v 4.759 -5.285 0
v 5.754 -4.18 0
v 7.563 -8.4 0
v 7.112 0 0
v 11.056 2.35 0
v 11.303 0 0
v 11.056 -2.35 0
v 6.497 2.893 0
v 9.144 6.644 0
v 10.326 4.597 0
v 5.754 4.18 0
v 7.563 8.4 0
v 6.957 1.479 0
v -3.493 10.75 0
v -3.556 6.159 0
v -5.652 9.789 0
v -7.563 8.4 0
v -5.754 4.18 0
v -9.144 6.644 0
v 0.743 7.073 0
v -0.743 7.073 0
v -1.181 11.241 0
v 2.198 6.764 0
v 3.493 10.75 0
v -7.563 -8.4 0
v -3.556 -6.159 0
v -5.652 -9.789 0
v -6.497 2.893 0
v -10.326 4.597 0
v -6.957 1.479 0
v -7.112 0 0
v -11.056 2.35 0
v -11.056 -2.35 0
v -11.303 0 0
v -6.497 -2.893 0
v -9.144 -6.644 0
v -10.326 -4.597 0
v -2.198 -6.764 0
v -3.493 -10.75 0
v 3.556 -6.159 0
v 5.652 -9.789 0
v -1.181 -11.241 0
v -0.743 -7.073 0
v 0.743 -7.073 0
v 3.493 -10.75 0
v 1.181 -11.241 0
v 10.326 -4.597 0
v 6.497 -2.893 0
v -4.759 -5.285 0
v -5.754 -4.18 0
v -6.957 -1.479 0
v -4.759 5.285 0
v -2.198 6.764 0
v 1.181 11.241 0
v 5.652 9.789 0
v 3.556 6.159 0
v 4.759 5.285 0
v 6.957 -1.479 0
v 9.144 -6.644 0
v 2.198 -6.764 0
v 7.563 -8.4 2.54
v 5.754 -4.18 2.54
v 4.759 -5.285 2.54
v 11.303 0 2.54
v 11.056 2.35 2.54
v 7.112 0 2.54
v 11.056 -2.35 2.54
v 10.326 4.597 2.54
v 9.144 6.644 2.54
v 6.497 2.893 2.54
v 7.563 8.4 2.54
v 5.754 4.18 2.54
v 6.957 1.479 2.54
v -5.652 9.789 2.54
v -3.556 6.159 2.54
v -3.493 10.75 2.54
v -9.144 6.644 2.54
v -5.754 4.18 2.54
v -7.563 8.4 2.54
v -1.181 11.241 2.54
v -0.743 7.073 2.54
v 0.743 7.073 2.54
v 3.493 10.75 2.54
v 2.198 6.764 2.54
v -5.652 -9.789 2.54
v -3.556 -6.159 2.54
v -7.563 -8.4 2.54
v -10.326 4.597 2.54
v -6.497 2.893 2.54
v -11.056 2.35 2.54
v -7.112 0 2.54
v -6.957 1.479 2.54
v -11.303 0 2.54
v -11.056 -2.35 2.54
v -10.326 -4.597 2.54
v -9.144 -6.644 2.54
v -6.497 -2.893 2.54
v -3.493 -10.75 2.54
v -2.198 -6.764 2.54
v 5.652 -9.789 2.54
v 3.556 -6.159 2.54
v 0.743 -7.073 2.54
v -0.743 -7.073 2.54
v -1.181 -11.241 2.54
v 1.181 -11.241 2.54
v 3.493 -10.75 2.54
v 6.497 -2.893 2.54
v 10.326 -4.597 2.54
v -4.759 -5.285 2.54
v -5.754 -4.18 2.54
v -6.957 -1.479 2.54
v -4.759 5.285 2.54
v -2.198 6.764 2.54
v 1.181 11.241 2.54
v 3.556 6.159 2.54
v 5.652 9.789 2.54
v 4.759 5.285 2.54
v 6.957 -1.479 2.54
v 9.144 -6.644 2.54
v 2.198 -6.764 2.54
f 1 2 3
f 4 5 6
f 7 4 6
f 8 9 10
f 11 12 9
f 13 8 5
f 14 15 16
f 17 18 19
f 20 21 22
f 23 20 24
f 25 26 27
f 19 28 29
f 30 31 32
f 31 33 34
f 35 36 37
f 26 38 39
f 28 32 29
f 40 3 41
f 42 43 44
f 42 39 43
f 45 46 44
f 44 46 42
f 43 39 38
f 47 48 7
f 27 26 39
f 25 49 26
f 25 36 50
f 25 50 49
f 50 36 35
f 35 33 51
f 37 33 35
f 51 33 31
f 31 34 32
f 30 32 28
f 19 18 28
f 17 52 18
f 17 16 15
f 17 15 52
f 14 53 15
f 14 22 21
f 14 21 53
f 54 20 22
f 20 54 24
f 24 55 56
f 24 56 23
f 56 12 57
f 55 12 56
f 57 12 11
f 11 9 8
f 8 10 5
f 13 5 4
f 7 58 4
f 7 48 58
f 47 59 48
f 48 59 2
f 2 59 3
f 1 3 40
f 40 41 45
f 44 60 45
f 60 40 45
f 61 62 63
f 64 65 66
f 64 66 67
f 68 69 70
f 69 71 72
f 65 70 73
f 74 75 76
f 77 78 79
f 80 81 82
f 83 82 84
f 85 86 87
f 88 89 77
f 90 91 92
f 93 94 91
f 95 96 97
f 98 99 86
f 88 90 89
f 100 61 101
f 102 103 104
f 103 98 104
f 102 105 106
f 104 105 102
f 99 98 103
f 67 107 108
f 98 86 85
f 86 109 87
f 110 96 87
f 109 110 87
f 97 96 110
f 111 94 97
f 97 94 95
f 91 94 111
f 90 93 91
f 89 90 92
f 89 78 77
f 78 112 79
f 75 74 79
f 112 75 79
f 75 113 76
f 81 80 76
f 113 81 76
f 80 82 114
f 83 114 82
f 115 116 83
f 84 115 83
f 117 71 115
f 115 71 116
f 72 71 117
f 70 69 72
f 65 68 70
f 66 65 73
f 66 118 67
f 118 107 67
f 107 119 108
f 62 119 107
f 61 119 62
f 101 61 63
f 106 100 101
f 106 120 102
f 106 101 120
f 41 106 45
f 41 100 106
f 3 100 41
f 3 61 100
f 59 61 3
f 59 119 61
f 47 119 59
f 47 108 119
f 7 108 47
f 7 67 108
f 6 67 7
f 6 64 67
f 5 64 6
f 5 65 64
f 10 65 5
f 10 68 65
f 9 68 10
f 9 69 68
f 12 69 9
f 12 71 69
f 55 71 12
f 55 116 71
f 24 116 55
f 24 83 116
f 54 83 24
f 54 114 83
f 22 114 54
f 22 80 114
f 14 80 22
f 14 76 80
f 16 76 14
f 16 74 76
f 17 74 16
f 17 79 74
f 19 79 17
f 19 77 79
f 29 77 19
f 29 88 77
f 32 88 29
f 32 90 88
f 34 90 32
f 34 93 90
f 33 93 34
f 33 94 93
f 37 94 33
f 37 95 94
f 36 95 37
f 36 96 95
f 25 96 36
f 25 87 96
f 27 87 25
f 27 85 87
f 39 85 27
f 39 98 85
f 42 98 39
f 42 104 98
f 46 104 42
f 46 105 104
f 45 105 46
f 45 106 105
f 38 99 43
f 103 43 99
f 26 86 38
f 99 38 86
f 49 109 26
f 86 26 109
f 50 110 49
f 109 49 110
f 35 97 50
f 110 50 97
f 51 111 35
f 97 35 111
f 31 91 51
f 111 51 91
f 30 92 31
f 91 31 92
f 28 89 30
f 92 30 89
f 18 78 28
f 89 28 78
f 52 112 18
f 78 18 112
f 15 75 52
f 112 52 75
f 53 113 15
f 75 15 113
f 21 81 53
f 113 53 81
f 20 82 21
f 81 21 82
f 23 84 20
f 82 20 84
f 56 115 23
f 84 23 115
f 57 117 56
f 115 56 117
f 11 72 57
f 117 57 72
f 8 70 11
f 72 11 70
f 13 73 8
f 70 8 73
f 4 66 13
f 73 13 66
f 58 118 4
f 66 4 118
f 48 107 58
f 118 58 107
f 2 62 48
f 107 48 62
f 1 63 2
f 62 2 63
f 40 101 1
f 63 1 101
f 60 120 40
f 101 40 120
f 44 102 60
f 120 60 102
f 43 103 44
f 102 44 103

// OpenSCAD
ViewScale = [0.0254, 0.0254, 0.0254];

module washer()
{
    linear_extrude(100)
    difference() {
        circle(890/2);
        circle(560/2);
    }
}

module forViewing()
{
    case();
}

module forPrinting()
{
    washer();
}

scale(ViewScale)
{
    //forViewing();
    forPrinting();
}
